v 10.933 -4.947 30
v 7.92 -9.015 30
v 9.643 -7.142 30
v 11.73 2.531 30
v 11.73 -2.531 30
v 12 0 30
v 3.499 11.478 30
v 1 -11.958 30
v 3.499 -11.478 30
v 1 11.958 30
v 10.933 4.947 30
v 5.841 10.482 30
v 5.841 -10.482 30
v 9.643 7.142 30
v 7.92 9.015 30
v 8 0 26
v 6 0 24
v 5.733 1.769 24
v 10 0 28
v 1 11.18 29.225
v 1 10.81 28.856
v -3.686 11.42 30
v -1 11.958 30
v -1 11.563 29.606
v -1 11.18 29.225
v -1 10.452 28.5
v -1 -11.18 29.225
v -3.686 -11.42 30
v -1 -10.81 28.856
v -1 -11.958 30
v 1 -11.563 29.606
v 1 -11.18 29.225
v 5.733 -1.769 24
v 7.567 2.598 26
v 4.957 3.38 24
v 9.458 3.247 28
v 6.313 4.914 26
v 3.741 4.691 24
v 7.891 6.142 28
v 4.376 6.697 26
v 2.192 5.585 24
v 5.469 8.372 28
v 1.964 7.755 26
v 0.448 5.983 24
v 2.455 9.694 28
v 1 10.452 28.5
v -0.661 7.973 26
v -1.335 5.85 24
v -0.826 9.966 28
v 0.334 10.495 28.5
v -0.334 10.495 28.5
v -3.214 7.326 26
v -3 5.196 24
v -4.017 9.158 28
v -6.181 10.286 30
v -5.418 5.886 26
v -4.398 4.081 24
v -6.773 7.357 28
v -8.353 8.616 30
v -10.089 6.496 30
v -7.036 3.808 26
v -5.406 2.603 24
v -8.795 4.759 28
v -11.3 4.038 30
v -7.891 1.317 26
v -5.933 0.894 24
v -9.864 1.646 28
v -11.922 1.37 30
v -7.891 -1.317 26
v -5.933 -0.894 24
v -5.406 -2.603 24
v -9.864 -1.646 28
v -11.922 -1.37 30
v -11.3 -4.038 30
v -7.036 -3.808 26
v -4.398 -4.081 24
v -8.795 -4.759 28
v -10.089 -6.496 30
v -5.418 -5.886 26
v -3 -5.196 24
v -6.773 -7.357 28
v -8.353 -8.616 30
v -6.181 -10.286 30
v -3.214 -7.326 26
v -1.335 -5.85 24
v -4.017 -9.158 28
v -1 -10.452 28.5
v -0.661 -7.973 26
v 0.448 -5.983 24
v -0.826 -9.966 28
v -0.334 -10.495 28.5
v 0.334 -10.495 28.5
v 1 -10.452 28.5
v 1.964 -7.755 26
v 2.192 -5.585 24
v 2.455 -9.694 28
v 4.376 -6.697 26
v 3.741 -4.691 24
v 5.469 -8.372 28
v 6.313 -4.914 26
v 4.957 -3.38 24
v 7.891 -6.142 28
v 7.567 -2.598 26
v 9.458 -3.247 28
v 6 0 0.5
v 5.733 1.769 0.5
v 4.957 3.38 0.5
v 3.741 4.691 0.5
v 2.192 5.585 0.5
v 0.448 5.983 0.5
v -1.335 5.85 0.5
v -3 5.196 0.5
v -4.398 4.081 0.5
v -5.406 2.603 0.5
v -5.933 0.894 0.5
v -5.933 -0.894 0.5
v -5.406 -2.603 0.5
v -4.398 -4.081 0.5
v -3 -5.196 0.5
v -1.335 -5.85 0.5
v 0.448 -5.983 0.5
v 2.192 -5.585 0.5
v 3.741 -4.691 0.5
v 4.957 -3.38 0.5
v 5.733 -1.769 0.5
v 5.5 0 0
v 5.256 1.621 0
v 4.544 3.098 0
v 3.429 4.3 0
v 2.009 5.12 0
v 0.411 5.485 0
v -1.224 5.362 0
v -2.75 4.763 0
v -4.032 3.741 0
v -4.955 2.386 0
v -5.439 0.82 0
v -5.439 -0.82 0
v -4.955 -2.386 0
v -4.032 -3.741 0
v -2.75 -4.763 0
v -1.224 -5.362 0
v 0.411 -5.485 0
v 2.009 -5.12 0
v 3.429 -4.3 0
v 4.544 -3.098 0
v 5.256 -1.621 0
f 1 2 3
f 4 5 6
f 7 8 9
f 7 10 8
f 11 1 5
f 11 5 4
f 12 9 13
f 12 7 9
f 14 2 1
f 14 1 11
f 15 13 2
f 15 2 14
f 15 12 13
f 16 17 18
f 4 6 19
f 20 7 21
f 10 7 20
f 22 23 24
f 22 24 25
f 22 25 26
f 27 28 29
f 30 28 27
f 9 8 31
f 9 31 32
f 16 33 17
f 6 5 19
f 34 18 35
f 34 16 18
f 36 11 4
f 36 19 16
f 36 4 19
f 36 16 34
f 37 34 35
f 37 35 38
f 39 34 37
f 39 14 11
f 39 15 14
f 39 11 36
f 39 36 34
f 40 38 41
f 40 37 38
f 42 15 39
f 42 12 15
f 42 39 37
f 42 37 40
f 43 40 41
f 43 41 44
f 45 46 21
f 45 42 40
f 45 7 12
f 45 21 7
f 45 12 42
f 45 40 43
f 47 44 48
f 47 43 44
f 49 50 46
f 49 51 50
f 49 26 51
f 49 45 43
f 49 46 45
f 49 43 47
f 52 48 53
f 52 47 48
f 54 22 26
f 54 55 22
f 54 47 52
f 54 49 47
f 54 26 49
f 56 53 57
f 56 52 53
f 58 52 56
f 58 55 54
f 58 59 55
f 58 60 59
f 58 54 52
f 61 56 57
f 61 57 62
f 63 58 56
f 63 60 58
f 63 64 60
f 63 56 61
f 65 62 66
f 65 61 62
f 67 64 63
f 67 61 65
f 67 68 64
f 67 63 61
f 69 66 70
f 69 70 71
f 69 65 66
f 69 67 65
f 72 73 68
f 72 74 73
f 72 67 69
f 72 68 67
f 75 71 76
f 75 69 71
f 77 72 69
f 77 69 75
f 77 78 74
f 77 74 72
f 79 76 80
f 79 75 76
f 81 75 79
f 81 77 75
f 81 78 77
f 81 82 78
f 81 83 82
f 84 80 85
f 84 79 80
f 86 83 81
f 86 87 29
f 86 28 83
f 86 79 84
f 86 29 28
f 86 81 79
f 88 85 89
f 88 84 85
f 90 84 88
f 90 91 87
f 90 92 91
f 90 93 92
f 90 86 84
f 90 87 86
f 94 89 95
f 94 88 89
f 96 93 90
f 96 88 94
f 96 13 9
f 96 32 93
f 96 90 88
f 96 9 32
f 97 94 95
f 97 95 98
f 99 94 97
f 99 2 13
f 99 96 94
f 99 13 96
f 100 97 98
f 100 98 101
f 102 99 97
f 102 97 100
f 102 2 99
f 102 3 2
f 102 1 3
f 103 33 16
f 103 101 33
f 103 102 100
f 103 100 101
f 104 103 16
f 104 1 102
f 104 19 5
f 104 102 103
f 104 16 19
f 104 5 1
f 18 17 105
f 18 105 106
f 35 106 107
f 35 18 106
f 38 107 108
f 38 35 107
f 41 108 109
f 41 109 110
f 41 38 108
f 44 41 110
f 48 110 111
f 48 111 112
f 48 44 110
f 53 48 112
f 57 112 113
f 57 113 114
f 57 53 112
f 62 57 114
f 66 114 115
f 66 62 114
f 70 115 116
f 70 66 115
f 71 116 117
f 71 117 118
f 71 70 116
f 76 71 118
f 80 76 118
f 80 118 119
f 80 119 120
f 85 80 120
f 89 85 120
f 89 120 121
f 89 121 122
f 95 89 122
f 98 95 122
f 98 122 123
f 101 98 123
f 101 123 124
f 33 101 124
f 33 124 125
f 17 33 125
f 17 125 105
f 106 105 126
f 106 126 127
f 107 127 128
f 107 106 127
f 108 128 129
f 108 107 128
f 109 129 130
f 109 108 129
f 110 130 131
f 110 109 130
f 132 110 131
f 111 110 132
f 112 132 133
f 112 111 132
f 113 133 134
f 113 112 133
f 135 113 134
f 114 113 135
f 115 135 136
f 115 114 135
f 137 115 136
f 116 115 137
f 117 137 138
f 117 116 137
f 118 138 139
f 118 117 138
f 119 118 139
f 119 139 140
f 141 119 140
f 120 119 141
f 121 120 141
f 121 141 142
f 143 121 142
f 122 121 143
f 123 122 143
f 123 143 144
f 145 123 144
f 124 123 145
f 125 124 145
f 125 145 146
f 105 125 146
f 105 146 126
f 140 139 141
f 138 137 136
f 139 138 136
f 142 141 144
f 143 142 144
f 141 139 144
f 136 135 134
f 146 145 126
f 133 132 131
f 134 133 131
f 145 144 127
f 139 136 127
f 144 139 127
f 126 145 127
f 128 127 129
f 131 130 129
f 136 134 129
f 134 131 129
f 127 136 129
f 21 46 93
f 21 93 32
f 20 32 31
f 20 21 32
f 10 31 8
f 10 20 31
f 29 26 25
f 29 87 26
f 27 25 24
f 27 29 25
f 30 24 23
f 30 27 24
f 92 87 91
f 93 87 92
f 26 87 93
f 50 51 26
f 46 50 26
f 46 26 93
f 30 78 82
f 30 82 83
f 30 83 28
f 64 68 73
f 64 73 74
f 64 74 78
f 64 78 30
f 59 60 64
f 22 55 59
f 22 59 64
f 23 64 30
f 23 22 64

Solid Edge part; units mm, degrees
sketch "Sketch1" plane through (0, 0, 0) normal (0, -1, 0) x (1, 0, 0)
  line L0 (6, 24) -> (12, 30)
  line L1 (0, 30) -> (12, 30)
  line L2 (0, 0) -> (0, 30)
  line L3 (0, 0) -> (6, 0)
  line L4 (6, 0) -> (6, 24)
revolve "RevolvedProtrusion1" add sketch "Sketch1" angle 360 about axis through (0, 0, 0) along (0, 0, 1)
cosmetic_thread "Thread1" size "Tr 12 x 3"
chamfer "Chamfer1" distance 0.5 angle 45 1 edges at (-6, 0, 0)
sketch "Sketch2" plane through (0, 0, 30) normal (0, 0, 1) x (1, 0, 0)
  line L0 (-1, 12) -> (-1, -12)
  line L1 (-1, -12) -> (1, -12)
  line L2 (1, -12) -> (1, 12)
  line L3 (1, 12) -> (-1, 12)
extrude "ExtrudedCutout_1" cut sketch "Sketch2" along normal mid plane 3
